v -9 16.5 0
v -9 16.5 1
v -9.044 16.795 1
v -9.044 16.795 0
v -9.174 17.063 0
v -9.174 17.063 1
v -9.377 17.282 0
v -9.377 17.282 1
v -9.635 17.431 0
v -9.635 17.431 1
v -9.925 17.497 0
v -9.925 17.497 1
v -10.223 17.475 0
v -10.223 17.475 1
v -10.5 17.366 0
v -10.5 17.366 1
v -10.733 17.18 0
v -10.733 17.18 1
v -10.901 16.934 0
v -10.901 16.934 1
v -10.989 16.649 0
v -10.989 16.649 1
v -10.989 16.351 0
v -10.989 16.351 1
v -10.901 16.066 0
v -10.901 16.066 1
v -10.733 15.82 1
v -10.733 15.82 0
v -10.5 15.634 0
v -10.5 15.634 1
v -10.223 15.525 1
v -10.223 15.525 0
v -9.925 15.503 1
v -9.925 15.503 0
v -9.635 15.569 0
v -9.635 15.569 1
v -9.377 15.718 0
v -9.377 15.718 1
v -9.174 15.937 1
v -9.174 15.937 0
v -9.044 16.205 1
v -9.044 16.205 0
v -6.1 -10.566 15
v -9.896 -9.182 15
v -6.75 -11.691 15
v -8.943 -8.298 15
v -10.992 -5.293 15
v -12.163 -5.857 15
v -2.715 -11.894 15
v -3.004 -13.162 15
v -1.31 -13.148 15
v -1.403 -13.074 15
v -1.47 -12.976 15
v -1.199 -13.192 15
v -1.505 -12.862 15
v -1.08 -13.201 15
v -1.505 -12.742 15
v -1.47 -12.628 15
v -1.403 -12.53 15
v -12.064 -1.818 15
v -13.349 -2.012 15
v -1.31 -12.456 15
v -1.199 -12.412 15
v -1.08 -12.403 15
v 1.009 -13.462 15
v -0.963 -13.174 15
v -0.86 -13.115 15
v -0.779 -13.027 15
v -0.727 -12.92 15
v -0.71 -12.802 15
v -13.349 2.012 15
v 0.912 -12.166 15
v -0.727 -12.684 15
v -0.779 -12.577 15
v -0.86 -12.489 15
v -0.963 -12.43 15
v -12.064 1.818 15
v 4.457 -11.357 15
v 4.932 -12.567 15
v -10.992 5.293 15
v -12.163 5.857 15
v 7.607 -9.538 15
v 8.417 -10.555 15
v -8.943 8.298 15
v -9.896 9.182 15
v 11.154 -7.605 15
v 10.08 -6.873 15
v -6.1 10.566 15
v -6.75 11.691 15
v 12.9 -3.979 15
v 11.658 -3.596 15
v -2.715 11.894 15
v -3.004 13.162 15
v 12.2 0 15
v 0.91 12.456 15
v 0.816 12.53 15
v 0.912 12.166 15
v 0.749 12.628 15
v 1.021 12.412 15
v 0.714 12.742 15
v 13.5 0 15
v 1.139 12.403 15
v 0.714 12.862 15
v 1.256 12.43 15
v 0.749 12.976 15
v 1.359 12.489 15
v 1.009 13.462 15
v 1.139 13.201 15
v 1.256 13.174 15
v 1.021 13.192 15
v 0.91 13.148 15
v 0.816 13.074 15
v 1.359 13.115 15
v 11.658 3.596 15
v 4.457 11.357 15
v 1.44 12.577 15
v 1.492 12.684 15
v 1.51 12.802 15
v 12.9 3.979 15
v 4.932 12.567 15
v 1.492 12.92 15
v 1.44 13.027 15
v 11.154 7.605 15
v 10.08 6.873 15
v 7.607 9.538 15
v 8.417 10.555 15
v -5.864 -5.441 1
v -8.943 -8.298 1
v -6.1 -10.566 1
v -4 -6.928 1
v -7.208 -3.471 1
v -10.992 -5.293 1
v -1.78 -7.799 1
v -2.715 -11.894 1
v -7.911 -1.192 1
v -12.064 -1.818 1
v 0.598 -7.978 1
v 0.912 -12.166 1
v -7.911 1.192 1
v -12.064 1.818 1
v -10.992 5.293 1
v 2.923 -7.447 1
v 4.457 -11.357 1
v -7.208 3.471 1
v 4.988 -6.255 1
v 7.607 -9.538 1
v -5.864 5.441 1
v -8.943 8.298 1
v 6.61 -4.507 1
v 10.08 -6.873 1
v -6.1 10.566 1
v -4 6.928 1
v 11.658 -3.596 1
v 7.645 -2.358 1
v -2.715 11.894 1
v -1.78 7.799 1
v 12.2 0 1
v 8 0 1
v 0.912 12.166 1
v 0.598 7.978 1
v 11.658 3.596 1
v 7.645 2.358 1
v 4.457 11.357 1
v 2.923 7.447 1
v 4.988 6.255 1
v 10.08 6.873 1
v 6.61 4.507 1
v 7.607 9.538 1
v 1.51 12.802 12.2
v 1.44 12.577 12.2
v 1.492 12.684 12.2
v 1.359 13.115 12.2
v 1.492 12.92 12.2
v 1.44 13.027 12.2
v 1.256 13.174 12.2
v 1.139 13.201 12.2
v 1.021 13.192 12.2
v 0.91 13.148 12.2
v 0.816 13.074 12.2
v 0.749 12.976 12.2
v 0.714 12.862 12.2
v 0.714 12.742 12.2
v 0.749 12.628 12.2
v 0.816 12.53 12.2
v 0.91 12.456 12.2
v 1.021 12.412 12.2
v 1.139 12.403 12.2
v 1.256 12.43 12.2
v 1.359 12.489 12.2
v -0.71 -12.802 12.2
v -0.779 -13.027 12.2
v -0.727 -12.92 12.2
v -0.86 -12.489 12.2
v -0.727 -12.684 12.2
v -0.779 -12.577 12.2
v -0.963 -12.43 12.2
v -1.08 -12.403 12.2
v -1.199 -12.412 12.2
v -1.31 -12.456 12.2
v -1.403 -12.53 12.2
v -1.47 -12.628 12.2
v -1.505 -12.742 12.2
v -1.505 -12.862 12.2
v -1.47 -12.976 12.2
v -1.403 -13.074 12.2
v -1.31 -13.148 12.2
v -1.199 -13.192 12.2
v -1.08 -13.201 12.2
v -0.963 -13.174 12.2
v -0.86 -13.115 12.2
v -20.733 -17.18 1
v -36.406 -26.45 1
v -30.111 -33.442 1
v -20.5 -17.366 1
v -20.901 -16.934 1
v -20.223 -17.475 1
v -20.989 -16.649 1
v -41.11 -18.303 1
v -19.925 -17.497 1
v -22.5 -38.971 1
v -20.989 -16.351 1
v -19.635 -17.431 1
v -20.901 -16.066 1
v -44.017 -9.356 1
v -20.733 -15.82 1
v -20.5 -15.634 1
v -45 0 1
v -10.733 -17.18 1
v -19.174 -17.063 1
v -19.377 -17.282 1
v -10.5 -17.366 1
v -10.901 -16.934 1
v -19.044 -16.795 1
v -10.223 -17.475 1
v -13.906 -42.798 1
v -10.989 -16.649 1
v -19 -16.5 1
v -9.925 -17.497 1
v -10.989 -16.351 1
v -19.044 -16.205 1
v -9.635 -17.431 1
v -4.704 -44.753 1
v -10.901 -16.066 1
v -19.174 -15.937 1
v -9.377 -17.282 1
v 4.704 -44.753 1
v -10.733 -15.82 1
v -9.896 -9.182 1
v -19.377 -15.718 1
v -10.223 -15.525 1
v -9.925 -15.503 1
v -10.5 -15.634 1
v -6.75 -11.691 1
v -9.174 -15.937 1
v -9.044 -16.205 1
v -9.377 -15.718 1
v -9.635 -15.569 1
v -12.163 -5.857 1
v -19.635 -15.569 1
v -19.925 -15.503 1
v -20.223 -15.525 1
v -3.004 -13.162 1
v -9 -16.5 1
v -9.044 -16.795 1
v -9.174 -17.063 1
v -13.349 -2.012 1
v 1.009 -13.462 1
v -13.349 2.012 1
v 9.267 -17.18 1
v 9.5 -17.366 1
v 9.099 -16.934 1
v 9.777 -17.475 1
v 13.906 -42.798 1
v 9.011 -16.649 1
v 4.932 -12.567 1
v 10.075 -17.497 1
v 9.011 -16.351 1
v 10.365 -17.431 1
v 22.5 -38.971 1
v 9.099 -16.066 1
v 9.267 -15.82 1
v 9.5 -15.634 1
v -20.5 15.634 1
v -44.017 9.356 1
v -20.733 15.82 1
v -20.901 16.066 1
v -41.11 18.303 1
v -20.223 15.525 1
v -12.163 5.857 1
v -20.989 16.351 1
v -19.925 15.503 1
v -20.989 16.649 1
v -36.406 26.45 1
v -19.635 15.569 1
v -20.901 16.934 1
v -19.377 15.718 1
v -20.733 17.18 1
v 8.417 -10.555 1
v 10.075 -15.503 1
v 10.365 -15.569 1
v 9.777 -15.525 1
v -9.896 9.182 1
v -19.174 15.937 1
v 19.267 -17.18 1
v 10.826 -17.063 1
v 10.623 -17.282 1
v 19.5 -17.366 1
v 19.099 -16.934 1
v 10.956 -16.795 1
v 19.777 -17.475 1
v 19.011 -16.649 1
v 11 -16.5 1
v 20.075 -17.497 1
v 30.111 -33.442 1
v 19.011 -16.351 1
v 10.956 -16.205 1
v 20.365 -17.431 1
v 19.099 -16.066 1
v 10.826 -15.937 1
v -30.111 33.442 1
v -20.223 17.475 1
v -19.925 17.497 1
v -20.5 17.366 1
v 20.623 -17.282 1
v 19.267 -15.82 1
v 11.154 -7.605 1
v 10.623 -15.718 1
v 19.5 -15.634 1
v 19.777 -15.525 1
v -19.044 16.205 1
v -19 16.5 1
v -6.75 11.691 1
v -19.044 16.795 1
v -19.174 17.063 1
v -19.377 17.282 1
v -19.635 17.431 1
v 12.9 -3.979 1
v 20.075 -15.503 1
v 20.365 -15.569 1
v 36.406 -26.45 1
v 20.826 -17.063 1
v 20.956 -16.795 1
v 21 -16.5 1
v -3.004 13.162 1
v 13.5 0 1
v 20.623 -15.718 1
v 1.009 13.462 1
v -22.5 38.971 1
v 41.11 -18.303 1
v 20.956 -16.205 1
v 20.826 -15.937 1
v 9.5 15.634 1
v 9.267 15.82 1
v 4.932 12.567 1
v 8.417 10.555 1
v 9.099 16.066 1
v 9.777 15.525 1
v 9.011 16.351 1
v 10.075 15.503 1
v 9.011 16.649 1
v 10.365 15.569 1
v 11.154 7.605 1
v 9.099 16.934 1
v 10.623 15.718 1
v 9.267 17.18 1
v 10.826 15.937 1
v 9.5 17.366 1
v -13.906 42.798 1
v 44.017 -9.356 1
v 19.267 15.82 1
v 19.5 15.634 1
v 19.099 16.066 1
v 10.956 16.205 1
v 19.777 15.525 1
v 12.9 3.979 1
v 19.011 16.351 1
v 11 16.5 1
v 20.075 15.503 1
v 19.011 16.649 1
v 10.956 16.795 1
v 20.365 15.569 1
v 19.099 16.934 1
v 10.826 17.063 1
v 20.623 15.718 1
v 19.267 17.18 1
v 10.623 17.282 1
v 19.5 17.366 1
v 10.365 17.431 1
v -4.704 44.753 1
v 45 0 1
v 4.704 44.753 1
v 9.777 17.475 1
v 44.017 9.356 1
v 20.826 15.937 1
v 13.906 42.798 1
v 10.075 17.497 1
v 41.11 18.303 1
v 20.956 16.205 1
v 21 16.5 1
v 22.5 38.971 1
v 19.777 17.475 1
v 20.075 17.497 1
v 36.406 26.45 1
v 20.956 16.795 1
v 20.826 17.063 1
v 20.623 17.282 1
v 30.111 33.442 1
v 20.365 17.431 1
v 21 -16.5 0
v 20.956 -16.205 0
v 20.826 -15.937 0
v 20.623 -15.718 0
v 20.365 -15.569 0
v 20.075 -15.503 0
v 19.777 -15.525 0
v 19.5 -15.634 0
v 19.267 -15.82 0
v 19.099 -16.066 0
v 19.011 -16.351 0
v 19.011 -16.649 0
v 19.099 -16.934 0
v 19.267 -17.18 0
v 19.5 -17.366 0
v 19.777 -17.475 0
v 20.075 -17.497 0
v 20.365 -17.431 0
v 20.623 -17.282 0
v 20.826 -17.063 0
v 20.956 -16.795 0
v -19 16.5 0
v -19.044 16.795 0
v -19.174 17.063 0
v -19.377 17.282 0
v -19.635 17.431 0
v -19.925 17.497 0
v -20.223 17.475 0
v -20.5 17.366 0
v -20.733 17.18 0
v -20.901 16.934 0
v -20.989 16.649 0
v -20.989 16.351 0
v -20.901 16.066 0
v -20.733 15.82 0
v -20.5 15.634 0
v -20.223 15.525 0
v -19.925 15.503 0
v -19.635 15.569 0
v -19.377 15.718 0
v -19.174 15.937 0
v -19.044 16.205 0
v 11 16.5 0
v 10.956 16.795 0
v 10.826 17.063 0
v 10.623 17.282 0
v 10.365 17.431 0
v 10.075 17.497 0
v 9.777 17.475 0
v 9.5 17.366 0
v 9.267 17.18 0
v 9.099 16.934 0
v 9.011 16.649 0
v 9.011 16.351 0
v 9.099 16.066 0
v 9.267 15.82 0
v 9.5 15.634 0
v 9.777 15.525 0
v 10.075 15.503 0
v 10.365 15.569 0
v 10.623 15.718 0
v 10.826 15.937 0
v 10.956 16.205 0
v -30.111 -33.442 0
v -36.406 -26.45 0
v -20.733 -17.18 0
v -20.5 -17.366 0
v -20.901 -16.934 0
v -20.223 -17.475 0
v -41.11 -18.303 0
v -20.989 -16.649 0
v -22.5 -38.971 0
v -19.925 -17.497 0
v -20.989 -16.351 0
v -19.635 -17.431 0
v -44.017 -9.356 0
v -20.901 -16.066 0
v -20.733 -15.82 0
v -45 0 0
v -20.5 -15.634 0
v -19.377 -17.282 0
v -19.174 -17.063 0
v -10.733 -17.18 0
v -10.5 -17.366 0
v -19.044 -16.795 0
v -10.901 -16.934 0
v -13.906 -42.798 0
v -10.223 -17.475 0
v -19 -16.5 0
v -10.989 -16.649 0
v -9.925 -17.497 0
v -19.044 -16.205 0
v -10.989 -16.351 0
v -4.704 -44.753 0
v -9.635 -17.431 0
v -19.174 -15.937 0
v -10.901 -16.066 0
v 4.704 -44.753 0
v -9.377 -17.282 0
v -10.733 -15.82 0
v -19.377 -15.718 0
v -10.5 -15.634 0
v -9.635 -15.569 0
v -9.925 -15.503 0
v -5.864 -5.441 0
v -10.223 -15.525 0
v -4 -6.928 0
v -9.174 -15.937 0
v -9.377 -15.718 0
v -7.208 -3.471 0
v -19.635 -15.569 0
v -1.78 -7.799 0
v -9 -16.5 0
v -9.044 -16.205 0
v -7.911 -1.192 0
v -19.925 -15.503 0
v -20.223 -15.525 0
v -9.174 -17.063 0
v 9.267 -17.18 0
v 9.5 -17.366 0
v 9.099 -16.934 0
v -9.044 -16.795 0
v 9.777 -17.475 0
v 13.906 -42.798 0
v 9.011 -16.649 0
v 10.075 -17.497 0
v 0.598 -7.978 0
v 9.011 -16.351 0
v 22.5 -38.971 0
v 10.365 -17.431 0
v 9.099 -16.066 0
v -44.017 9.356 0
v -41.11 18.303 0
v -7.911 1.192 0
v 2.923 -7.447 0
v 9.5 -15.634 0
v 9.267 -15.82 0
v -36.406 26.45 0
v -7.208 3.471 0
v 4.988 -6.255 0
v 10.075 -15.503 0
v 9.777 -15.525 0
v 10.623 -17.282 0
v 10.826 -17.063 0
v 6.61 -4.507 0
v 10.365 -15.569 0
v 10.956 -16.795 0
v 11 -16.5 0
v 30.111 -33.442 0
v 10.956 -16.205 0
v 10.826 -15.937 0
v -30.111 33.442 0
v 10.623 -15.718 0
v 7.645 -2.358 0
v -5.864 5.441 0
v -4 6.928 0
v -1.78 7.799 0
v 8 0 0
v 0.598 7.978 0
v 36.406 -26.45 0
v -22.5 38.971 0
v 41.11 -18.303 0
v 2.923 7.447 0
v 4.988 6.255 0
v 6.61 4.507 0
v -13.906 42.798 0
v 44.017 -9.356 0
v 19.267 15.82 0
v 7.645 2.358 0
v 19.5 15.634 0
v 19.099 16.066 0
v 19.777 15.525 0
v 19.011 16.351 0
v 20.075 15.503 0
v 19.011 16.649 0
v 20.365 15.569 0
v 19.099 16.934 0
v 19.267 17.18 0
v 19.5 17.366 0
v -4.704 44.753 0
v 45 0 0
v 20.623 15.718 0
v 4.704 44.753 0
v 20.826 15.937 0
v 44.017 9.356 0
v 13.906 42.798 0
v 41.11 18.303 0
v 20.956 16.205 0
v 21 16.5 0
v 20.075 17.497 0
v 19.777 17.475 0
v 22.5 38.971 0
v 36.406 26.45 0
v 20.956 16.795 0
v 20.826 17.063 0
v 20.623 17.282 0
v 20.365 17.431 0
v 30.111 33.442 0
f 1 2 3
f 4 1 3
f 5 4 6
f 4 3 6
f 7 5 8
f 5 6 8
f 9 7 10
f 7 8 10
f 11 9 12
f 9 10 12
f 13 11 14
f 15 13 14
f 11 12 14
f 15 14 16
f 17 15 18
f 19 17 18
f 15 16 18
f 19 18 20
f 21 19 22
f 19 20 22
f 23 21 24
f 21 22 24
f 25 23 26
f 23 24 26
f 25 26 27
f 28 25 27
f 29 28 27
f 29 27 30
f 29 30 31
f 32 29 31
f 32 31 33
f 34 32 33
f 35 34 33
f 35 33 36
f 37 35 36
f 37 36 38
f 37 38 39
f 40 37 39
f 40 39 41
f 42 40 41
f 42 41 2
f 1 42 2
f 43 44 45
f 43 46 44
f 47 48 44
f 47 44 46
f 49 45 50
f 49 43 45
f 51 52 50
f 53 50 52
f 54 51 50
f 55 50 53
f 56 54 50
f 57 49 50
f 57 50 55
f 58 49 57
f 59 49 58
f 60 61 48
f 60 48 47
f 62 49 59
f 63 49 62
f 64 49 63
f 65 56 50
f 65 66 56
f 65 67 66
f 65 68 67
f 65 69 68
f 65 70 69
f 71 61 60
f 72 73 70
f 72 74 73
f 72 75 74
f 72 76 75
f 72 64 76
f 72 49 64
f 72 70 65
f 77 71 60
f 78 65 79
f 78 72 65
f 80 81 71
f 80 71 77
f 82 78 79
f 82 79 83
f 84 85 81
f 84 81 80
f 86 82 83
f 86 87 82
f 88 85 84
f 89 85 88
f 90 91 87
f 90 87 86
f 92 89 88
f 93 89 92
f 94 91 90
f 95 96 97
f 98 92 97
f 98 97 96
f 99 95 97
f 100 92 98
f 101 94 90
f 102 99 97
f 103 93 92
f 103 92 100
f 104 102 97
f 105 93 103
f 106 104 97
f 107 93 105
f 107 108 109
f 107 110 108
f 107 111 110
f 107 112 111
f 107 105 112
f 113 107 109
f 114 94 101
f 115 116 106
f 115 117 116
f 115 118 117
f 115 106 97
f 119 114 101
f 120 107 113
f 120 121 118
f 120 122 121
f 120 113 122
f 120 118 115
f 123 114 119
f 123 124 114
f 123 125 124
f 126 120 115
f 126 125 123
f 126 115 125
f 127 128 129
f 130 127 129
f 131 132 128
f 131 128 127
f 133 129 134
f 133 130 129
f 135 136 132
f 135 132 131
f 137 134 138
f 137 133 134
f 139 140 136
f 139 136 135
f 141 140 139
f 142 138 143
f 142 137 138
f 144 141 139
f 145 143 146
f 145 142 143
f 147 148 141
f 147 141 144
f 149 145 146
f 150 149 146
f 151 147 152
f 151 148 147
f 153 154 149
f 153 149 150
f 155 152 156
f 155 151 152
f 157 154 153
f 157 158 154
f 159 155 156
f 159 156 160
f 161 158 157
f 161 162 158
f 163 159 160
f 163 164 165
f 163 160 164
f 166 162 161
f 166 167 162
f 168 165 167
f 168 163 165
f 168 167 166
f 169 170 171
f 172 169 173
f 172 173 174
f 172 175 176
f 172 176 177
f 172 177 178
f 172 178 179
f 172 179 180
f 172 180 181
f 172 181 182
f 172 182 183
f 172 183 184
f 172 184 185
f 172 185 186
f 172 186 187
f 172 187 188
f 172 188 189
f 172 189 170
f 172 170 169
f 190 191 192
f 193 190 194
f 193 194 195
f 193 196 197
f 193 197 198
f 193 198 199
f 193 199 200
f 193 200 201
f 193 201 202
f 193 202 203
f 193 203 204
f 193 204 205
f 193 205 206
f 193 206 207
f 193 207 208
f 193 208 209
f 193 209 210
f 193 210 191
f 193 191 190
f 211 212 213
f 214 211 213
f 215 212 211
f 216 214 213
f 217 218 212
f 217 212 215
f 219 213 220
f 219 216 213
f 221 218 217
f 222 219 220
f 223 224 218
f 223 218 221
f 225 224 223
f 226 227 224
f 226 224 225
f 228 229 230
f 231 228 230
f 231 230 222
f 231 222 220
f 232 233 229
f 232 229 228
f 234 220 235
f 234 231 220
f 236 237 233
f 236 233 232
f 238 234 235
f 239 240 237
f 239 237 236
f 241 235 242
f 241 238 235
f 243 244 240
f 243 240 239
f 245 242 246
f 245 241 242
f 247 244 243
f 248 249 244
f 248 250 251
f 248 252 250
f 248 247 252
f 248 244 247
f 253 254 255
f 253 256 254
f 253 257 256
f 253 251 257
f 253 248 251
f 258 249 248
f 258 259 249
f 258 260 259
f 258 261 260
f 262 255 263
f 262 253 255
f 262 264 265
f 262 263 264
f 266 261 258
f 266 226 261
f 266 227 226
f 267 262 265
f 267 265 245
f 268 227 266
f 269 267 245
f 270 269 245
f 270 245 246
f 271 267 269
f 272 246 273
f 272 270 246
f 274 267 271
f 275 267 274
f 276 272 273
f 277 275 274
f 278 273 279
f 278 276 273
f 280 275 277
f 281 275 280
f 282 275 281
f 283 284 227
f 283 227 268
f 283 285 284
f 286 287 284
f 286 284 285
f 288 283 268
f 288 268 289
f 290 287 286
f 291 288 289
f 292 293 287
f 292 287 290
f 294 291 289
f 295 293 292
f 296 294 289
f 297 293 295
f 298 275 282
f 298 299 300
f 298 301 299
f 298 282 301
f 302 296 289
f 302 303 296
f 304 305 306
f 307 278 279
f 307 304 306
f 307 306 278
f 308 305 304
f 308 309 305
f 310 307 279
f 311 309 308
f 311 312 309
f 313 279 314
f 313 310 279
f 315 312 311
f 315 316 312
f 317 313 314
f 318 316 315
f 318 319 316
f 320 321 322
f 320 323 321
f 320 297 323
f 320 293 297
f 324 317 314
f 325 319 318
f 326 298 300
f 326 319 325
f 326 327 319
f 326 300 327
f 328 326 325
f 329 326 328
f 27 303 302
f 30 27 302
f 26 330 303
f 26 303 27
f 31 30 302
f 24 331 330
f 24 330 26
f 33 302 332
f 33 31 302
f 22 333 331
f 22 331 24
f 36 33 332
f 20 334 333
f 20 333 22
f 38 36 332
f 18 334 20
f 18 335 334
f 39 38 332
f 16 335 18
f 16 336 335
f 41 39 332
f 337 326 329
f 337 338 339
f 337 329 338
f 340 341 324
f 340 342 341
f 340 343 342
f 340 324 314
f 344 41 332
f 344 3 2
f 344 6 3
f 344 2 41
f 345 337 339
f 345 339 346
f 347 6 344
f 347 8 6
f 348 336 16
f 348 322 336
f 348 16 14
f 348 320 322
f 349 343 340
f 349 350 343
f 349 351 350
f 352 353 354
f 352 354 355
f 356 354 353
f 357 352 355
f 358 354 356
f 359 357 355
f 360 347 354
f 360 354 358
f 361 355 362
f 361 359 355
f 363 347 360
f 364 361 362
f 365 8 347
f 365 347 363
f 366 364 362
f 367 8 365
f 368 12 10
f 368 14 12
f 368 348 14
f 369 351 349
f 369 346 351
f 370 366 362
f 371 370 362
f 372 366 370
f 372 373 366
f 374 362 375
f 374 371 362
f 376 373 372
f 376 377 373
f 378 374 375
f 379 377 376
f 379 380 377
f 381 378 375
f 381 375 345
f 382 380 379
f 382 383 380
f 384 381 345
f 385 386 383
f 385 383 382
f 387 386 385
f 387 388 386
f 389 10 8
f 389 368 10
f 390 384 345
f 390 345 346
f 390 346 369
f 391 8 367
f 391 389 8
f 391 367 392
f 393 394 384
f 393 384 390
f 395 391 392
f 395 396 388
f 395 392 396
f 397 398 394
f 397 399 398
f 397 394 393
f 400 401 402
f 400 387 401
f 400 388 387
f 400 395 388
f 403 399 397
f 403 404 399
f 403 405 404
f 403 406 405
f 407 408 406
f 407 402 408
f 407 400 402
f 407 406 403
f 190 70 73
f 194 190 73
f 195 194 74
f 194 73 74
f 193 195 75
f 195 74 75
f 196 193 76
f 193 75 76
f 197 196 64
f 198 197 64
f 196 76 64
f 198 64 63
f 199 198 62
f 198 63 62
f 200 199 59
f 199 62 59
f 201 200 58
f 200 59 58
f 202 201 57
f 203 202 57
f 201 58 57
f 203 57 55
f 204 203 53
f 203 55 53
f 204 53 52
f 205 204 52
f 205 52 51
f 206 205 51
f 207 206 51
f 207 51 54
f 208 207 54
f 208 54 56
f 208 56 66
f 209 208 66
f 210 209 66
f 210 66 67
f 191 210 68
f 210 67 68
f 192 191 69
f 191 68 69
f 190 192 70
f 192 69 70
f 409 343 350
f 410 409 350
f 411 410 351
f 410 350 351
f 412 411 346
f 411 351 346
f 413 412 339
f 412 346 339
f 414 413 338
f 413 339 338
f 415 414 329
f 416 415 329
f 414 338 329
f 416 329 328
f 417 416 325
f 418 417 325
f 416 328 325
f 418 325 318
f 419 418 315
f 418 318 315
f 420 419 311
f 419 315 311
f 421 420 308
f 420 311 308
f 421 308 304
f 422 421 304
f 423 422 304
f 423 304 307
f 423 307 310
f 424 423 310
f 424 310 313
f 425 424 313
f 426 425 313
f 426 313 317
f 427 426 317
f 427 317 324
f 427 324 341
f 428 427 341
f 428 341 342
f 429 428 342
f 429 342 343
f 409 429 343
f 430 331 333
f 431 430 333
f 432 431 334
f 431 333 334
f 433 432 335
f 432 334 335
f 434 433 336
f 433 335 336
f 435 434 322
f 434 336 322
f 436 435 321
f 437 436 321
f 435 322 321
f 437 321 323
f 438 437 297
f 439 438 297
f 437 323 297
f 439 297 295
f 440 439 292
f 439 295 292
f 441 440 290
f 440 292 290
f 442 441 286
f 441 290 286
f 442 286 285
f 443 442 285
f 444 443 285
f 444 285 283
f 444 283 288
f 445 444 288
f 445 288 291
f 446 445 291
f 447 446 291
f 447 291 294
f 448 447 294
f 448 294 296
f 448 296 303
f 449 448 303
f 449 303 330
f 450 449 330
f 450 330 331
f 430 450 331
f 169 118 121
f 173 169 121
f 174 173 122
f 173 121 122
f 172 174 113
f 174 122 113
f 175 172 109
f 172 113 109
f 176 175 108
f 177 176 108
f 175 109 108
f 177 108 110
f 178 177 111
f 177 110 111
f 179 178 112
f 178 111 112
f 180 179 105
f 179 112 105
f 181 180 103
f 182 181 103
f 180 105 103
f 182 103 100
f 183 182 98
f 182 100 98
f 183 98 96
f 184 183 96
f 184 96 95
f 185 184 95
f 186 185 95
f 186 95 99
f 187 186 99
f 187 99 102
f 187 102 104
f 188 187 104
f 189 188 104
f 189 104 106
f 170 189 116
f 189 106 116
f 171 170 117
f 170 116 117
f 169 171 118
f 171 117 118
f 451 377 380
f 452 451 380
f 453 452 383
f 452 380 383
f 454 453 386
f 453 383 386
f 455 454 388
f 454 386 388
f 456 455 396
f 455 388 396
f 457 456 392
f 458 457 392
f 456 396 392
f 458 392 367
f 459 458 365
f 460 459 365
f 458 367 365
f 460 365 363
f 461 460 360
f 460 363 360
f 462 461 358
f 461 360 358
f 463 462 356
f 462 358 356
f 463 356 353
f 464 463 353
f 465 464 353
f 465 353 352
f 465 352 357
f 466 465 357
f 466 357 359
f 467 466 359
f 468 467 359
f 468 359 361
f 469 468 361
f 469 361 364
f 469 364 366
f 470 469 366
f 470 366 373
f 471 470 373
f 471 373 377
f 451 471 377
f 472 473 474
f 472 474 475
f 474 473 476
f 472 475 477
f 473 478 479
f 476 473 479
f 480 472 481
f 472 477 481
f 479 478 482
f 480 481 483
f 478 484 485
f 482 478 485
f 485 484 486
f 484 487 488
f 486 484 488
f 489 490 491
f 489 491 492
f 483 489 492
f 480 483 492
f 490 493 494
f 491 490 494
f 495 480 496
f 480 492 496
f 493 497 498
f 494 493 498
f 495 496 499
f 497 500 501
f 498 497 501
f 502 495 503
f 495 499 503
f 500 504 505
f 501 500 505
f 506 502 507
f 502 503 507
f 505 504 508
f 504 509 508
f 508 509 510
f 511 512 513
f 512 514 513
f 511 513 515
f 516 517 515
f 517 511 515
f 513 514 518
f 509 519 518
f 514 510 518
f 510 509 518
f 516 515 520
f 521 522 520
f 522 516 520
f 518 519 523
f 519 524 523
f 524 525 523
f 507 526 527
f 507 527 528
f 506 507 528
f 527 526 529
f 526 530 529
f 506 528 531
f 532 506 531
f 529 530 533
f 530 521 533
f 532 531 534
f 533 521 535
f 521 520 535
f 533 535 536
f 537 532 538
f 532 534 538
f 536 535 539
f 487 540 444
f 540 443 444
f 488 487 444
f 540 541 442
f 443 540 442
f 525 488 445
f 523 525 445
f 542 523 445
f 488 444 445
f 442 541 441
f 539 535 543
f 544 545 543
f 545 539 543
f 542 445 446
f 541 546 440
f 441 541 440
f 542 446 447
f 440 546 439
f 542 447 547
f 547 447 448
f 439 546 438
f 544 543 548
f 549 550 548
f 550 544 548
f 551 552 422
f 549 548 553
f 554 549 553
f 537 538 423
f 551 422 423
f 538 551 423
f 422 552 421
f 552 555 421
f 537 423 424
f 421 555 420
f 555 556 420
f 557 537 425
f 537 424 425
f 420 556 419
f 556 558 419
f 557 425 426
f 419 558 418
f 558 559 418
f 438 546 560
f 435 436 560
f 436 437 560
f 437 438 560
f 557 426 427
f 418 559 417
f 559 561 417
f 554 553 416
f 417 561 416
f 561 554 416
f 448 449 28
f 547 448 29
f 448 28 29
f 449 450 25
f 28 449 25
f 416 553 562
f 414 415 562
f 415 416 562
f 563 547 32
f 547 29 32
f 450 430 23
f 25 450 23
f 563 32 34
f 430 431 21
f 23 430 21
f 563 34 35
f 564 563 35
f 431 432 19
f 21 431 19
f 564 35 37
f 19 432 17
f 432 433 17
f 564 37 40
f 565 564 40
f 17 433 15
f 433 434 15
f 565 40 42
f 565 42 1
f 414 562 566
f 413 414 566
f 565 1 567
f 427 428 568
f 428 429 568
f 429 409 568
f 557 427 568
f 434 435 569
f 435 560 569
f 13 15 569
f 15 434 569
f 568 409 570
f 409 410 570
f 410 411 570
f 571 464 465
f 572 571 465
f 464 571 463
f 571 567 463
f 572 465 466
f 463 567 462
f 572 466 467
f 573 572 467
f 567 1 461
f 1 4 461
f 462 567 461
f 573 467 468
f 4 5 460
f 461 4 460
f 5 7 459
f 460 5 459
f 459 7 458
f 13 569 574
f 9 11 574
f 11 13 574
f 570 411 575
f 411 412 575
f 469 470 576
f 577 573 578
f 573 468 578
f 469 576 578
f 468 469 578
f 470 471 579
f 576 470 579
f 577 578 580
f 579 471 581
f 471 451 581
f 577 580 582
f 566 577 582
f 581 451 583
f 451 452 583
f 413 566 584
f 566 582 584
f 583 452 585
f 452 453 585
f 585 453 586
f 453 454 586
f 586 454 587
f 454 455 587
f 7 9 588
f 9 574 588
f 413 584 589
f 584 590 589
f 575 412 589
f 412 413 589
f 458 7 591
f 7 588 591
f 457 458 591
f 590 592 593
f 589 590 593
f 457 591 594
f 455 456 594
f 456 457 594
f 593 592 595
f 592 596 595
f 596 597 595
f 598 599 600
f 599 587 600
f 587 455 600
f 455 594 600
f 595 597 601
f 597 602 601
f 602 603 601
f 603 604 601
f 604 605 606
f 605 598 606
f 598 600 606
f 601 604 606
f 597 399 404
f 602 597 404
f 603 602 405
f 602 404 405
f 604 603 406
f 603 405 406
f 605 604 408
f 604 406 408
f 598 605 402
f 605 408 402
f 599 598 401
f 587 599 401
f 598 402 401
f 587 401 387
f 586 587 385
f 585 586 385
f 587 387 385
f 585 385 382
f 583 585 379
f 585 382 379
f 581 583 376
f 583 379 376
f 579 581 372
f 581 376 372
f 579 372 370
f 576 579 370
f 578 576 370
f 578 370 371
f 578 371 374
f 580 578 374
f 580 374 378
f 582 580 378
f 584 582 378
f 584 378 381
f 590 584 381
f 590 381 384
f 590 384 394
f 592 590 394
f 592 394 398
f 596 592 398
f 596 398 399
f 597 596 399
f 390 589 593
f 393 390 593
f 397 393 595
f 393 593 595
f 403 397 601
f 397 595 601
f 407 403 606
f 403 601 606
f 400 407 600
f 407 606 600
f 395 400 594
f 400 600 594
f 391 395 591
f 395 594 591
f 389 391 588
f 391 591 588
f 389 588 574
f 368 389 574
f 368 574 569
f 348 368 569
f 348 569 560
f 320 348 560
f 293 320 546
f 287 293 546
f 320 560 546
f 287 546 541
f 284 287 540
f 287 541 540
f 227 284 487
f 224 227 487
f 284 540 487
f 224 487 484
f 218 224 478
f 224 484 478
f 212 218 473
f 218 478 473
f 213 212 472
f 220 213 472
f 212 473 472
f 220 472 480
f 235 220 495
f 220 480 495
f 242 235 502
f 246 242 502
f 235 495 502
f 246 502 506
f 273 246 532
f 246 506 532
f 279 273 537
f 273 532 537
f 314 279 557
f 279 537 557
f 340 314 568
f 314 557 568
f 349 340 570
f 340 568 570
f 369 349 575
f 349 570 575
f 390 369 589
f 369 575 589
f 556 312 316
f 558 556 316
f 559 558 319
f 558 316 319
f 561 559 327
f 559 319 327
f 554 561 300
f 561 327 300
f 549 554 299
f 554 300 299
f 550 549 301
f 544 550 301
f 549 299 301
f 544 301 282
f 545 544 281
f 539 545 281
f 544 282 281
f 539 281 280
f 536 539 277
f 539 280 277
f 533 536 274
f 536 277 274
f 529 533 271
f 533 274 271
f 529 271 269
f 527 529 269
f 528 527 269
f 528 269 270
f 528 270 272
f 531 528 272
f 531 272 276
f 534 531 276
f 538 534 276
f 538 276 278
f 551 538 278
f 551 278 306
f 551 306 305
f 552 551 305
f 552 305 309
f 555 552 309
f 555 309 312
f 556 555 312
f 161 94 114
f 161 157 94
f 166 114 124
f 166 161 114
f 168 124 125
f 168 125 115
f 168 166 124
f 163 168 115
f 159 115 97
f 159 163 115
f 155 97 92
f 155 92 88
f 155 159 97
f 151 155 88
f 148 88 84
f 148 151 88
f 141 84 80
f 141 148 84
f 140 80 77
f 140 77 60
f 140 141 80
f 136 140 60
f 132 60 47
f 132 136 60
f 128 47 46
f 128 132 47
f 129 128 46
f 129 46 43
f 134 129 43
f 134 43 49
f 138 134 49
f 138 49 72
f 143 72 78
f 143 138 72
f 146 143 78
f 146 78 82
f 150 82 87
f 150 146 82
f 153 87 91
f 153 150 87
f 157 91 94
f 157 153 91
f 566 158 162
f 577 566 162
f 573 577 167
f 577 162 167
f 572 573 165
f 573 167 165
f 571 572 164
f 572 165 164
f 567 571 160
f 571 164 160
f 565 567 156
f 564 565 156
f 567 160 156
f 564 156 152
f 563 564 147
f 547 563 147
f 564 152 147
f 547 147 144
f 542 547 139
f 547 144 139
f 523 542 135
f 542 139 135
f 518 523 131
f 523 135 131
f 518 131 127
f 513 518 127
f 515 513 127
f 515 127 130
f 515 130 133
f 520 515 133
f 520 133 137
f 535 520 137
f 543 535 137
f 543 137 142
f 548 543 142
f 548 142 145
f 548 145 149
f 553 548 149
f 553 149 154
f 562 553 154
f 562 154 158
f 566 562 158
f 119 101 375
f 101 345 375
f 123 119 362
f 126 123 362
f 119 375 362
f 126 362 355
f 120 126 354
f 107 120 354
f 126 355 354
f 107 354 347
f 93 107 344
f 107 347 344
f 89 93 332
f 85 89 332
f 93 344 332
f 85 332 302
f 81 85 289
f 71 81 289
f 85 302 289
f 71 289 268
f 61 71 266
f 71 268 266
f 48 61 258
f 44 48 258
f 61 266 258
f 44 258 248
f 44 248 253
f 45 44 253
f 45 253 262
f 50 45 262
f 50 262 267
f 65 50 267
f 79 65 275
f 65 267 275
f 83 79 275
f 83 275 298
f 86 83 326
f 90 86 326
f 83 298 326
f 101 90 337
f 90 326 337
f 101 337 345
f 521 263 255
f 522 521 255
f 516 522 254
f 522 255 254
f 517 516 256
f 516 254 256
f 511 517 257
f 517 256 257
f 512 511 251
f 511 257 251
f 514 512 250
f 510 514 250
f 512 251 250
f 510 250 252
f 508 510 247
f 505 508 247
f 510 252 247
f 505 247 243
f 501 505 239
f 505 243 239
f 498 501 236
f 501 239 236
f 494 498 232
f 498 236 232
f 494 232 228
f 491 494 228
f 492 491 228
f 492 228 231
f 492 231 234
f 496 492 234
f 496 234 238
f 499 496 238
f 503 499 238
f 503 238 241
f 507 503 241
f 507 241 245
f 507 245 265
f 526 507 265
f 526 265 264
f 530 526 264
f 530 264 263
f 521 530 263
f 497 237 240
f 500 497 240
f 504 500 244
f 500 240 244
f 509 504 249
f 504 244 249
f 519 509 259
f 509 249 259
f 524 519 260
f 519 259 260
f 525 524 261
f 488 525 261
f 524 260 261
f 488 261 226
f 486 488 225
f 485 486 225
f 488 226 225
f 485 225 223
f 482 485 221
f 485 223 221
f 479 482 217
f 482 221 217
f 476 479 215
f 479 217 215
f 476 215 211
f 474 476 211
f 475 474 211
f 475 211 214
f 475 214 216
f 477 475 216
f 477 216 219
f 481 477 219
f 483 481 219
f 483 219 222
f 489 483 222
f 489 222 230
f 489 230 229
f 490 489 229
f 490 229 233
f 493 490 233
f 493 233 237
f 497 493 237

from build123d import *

# Parameters (mm, degrees)
SKETCH_1_R          = 45
EXTRUDE_1_DEPTH     = 1
SKETCH_2_R          = 1
CUT_EXTRUDE_1_DEPTH = 64.647466564
SKETCH_3_R          = 13.5
SKETCH_3_R_2        = 12.2
EXTRUDE_2_DEPTH     = 6
SKETCH_4_R          = 4
CUT_EXTRUDE_2_DEPTH = 64.921827258
SKETCH_5_R          = 8
CUT_EXTRUDE_3_DEPTH = 10
SKETCH_6_R          = 13.5
SKETCH_6_R_2        = 12.2
EXTRUDE_3_DEPTH     = 8
SKETCH_7_R          = 0.4
CUT_EXTRUDE_4_DEPTH = 2.8


with BuildPart() as part:
    # 草图1 → 凸台-拉伸1 (new body)
    with BuildSketch(Plane.XY):
        Circle(SKETCH_1_R)
    extrude(amount=EXTRUDE_1_DEPTH)

    # 草图2 → 切除-拉伸1 (cut, through all)
    with BuildSketch(Plane.XY.offset(1)):
        with Locations((20, -16.5)):
            Circle(SKETCH_2_R)
        with Locations((20, 16.5)):
            Circle(SKETCH_2_R)
        with Locations((-20, 16.5)):
            Circle(SKETCH_2_R)
        with Locations((-20, -16.5)):
            Circle(SKETCH_2_R)
        with Locations((10, -16.5)):
            Circle(SKETCH_2_R)
        with Locations((10, 16.5)):
            Circle(SKETCH_2_R)
        with Locations((-10, 16.5)):
            Circle(SKETCH_2_R)
        with Locations((-10, -16.5)):
            Circle(SKETCH_2_R)
    extrude(amount=-CUT_EXTRUDE_1_DEPTH, mode=Mode.SUBTRACT)

    # 草图3 → 凸台-拉伸2 (add)
    with BuildSketch(Plane.XY.offset(1)):
        Circle(SKETCH_3_R)
        Circle(SKETCH_3_R_2, mode=Mode.SUBTRACT)
    extrude(amount=EXTRUDE_2_DEPTH)

    # 草图4 → 切除-拉伸2 (cut, through all)
    with BuildSketch(Plane.XY.offset(1)):
        Circle(SKETCH_4_R)
    extrude(amount=-CUT_EXTRUDE_2_DEPTH, mode=Mode.SUBTRACT)

    # 草图5 → 切除-拉伸3 (cut)
    with BuildSketch(Plane.XY.offset(1)):
        Circle(SKETCH_5_R)
    extrude(amount=-CUT_EXTRUDE_3_DEPTH, mode=Mode.SUBTRACT)

    # 草图6 → 凸台-拉伸3 (add)
    with BuildSketch(Plane.XY.offset(7)):
        Circle(SKETCH_6_R)
        Circle(SKETCH_6_R_2, mode=Mode.SUBTRACT)
    extrude(amount=EXTRUDE_3_DEPTH)

    # 草图7 → 切除-拉伸4 (cut)
    with BuildSketch(Plane(origin=(65.728441972, -2.343791879, 15), x_dir=(0.9999857974272592, -0.005329628858411386, 0), z_dir=(0, 0, 1))):
        with Locations(Location((-64.698660153, 14.801186776, 0), (0, 0, 0.305366686))):
            Circle(SKETCH_7_R)
        with Locations(Location((-66.781339847, -10.814285995, 0), (0, 0, 0.305366686))):
            Circle(SKETCH_7_R)
    extrude(amount=-CUT_EXTRUDE_4_DEPTH, mode=Mode.SUBTRACT)


solid = part.part
